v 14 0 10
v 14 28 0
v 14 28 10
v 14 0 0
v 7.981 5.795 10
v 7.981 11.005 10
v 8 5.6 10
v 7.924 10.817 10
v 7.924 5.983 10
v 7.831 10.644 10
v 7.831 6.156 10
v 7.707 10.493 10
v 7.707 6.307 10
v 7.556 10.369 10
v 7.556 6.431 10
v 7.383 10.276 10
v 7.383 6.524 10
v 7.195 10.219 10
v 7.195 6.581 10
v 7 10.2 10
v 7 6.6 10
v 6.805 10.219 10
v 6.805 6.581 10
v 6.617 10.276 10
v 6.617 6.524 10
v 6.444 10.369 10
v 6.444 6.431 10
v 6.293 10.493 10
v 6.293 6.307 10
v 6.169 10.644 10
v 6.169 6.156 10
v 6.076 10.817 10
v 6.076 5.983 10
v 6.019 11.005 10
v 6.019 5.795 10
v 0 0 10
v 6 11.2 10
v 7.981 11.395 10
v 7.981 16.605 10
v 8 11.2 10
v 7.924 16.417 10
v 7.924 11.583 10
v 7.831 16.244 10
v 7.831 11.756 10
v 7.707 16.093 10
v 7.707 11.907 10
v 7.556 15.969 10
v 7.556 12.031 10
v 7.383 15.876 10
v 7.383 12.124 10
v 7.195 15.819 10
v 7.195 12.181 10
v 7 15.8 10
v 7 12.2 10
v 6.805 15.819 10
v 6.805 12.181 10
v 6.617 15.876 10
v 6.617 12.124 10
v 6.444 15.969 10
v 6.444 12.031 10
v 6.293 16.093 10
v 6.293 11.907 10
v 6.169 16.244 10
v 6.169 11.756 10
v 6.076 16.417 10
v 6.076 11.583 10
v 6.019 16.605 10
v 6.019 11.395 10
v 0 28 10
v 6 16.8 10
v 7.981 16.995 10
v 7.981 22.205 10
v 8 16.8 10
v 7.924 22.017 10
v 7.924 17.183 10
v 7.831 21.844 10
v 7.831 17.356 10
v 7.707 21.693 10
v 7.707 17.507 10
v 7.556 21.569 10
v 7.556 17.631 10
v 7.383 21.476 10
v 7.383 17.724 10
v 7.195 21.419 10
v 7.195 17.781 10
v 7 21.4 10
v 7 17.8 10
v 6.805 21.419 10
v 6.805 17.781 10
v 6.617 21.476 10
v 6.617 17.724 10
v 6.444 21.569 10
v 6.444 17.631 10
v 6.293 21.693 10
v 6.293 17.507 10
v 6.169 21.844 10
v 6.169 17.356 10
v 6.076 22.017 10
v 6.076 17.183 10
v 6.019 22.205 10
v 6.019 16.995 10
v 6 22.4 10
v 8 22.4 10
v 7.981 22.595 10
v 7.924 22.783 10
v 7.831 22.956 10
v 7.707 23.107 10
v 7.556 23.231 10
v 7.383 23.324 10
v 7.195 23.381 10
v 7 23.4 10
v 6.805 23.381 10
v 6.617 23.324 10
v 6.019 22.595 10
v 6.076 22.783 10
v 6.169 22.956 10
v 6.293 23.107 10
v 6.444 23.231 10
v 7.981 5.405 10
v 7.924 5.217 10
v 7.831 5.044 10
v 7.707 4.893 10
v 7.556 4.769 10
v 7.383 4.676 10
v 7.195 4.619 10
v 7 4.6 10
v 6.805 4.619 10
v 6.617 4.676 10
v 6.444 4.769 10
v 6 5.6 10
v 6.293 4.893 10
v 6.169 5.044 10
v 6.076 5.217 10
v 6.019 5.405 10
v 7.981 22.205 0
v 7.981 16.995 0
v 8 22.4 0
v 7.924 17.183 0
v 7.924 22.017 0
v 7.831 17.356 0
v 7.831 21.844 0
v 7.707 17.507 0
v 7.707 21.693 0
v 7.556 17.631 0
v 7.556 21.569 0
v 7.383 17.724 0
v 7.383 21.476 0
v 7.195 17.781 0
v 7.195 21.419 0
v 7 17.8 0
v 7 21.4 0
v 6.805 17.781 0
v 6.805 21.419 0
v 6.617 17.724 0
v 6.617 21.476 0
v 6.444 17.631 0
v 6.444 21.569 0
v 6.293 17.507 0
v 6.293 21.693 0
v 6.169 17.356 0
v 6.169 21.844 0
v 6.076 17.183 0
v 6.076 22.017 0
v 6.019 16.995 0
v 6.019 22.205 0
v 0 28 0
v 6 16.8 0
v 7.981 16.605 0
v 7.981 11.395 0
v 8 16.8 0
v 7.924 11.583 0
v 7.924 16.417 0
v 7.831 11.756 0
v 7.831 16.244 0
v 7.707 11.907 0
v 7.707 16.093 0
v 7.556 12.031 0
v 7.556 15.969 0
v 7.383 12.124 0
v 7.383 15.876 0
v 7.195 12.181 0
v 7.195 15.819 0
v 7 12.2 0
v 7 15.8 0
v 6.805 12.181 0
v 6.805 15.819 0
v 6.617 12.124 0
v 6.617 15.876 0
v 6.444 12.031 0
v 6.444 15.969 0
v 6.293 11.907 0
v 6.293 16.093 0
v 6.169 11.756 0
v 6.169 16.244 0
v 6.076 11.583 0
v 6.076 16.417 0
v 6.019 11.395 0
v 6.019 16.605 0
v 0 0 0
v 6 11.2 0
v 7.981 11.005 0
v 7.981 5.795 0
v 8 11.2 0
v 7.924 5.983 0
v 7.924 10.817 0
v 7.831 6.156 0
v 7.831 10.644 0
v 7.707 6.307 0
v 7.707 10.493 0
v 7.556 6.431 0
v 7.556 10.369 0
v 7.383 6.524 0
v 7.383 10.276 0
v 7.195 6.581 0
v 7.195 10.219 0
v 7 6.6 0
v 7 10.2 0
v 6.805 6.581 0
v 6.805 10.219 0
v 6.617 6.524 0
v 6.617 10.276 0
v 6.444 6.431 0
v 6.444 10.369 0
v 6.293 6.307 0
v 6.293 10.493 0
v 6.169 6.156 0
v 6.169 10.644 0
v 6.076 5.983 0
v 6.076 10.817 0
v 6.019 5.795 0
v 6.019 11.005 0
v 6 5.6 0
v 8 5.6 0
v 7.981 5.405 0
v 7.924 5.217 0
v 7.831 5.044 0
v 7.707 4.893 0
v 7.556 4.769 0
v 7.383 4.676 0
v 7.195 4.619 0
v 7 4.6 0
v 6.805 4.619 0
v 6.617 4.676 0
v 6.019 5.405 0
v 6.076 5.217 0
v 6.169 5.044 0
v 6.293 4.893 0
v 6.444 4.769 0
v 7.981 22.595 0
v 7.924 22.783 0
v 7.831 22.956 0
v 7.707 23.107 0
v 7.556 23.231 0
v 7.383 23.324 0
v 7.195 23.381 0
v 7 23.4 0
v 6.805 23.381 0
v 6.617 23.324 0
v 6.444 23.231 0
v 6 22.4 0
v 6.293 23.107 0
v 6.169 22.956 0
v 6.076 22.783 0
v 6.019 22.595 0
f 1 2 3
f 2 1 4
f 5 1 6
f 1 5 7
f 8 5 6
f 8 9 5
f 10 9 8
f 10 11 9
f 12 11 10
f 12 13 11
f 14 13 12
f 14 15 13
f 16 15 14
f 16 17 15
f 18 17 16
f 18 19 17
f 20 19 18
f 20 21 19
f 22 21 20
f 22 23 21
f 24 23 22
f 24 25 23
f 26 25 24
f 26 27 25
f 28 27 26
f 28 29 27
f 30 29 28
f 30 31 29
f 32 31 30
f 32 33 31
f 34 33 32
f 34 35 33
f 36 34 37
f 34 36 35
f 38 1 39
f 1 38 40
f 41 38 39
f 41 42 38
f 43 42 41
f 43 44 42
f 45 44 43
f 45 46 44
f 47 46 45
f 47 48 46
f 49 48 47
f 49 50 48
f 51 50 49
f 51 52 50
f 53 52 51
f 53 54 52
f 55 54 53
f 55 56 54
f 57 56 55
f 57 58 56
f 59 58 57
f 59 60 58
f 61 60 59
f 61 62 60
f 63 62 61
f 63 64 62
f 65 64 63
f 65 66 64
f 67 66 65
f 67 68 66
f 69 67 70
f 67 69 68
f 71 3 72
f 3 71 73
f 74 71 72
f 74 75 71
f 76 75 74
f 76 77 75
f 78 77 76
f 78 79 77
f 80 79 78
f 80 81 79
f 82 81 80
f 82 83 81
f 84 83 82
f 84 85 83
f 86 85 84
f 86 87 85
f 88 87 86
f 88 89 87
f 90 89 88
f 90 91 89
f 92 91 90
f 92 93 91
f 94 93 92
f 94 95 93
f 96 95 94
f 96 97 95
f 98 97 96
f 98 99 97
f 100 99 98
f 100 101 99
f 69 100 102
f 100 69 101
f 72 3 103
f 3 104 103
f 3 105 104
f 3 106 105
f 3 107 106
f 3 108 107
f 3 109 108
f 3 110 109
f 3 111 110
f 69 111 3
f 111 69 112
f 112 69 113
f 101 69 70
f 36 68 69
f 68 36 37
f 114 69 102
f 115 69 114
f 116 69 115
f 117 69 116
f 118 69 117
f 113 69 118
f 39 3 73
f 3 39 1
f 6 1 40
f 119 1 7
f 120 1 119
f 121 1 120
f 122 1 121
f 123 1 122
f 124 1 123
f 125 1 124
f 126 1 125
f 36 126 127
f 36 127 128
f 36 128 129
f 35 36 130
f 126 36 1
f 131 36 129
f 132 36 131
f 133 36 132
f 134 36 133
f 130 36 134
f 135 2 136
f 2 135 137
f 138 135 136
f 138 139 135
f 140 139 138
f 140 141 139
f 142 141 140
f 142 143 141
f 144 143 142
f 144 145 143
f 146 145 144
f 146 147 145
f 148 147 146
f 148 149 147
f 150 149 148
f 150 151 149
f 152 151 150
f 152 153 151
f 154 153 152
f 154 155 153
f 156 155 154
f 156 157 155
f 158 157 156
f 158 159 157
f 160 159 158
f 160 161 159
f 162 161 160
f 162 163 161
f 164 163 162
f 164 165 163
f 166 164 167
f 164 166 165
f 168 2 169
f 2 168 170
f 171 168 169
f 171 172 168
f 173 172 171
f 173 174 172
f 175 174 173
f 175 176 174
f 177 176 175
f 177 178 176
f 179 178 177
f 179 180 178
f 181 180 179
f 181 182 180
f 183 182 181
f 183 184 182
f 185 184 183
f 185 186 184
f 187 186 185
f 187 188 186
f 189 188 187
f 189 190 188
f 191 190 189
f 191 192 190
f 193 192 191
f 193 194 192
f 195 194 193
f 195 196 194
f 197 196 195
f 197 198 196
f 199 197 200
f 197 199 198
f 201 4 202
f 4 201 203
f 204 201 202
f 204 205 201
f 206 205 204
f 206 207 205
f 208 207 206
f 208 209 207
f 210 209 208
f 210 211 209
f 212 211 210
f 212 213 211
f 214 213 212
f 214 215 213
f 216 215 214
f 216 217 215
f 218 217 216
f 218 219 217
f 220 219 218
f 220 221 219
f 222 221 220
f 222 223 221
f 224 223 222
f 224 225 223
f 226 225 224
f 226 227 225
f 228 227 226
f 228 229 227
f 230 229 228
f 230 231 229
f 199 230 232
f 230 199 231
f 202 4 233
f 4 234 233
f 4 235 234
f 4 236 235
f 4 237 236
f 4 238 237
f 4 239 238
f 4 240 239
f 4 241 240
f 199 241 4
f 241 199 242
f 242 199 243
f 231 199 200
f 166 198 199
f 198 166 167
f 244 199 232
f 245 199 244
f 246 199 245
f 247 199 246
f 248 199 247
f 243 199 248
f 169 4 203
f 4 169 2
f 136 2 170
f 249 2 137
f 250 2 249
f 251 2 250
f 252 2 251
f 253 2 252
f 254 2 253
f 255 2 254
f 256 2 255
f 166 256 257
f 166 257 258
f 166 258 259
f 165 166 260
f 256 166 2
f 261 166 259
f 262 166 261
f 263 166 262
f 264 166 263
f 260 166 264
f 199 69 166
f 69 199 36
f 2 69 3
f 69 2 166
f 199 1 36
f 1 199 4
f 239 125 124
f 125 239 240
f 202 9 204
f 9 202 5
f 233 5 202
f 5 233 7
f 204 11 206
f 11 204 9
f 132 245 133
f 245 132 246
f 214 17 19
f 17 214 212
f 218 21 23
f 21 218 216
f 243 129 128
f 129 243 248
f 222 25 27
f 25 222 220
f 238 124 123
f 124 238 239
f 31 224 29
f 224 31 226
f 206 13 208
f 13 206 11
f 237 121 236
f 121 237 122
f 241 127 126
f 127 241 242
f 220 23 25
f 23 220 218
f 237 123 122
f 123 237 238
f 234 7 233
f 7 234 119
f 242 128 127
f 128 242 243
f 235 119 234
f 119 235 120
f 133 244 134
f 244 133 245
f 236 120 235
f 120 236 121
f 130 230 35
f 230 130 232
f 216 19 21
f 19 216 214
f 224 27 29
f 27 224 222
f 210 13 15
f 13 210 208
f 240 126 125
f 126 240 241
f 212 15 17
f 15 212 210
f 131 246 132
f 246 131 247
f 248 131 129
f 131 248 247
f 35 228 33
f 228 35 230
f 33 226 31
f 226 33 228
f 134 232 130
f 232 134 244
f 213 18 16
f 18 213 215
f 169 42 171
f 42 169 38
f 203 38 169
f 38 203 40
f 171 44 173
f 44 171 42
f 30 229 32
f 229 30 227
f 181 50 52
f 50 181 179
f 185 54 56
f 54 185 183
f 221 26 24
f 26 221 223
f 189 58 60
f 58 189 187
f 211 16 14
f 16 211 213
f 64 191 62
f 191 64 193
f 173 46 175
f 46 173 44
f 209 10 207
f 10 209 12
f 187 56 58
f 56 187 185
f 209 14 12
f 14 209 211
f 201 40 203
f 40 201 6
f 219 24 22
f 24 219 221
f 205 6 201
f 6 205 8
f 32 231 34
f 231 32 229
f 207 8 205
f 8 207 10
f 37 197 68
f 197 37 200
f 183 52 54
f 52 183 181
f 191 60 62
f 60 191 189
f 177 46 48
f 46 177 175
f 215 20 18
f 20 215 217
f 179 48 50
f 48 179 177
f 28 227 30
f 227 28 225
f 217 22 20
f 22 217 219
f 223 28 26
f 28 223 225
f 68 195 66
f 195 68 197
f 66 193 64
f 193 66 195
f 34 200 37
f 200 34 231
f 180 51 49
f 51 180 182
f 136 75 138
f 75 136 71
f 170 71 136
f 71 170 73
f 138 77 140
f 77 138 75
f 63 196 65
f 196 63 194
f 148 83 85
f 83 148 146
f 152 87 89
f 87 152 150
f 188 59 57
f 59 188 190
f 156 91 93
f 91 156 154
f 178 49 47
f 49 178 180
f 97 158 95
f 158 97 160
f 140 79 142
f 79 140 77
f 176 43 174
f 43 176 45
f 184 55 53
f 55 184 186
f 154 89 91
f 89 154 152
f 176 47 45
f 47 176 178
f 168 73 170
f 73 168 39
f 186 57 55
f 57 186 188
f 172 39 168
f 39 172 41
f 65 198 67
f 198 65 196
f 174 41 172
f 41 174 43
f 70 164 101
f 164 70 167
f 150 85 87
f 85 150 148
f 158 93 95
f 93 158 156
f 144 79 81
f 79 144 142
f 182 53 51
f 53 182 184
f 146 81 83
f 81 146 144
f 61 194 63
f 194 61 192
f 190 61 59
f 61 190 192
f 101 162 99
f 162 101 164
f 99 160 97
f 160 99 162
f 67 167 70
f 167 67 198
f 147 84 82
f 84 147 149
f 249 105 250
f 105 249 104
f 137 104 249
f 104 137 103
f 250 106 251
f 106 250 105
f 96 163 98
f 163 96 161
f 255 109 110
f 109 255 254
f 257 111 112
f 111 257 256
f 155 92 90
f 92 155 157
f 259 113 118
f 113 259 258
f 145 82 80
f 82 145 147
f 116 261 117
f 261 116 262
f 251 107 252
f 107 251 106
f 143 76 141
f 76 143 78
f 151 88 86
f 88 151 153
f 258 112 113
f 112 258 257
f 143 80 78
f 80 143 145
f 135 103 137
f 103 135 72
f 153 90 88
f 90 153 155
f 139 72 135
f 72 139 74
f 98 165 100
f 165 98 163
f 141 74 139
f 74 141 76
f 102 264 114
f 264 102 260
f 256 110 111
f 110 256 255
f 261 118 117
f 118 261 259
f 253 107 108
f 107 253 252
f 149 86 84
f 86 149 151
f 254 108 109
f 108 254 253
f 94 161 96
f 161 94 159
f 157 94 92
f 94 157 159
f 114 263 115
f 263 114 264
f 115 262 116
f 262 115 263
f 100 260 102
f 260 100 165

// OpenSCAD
/**
 * Martin Egli
 * 2022-01-24
 * helper for wood dowels (Holzdübel)
 */

module dowel_marker(dowel_dia = 5.5, loc_res = 32) {
    difference() {
        union() {
            translate([0, 0, 0])
            cylinder(d1 = dowel_dia+2, d2 = dowel_dia, h = 0.6, $fn = loc_res);
            translate([0, 0, 0])
            cylinder(d = dowel_dia, h = 4, $fn = loc_res);
        }
        translate([0, 0, -1])
        cylinder(d = 0.8, h = 10, $fn = loc_res);
    }
}

module dowel_guide_28x9mm(dowel_dia = 6, loc_res = 32) {
    difference() {
        translate([-2, 0, -5])
        cube([9+4, 28, 15]);
        translate([0, 0, -6])
        cube([9, 28, 6]);
        
        translate([9/2, 1*28/4, -6])
        cylinder(d = dowel_dia, h = 20, $fn = loc_res);
        translate([9/2, 3*28/4, -6])
        cylinder(d = dowel_dia, h = 20, $fn = loc_res);
    
        translate([10.5, 4, 0])
        rotate([90, 0, 90])
        linear_extrude(1)
        scale([0.4, 0.4, 1])
        text("28x9mm");
    }
}

module dowel_guide_47x18mm(dowel_dia = 6, loc_res = 32) {
    difference() {
        translate([0, 0, 0])
        cube([18, 47, 10]);
        
        translate([1*18/3, 1*47/6, -6])
        cylinder(d = dowel_dia, h = 20, $fn = loc_res);
        translate([2*18/3, 3*47/6, -6])
        cylinder(d = dowel_dia, h = 20, $fn = loc_res);
        translate([1*18/3, 5*47/6, -6])
        cylinder(d = dowel_dia, h = 20, $fn = loc_res);
    
        translate([17.5, 10, 3])
        rotate([90, 0, 90])
        linear_extrude(1)
        scale([0.4, 0.4, 1])
        text("18x47mm");
    }
}

module drillguide_28x14mm(drill_dia = 2, loc_res = 32) {
    difference() {
        translate([0, 0, 0])
        cube([14, 28, 10]);
        
        translate([14/2, 1*28/5, -6])
        cylinder(d = drill_dia, h = 20, $fn = loc_res);
        translate([14/2, 2*28/5, -6])
        cylinder(d = drill_dia, h = 20, $fn = loc_res);
        translate([14/2, 3*28/5, -6])
        cylinder(d = drill_dia, h = 20, $fn = loc_res);
        translate([14/2, 4*28/5, -6])
        cylinder(d = drill_dia, h = 20, $fn = loc_res);
    
        /*translate([10.5, 10, 3])
        rotate([90, 0, 90])
        linear_extrude(10)
        scale([0.4, 0.4, 1])
        text("18x47mm");*/
    }
}

//dowel_marker(); // 8 x
//dowel_guide_28x9mm();   // 1 x
//dowel_guide_47x18mm(); // 1 x
drillguide_28x14mm();
